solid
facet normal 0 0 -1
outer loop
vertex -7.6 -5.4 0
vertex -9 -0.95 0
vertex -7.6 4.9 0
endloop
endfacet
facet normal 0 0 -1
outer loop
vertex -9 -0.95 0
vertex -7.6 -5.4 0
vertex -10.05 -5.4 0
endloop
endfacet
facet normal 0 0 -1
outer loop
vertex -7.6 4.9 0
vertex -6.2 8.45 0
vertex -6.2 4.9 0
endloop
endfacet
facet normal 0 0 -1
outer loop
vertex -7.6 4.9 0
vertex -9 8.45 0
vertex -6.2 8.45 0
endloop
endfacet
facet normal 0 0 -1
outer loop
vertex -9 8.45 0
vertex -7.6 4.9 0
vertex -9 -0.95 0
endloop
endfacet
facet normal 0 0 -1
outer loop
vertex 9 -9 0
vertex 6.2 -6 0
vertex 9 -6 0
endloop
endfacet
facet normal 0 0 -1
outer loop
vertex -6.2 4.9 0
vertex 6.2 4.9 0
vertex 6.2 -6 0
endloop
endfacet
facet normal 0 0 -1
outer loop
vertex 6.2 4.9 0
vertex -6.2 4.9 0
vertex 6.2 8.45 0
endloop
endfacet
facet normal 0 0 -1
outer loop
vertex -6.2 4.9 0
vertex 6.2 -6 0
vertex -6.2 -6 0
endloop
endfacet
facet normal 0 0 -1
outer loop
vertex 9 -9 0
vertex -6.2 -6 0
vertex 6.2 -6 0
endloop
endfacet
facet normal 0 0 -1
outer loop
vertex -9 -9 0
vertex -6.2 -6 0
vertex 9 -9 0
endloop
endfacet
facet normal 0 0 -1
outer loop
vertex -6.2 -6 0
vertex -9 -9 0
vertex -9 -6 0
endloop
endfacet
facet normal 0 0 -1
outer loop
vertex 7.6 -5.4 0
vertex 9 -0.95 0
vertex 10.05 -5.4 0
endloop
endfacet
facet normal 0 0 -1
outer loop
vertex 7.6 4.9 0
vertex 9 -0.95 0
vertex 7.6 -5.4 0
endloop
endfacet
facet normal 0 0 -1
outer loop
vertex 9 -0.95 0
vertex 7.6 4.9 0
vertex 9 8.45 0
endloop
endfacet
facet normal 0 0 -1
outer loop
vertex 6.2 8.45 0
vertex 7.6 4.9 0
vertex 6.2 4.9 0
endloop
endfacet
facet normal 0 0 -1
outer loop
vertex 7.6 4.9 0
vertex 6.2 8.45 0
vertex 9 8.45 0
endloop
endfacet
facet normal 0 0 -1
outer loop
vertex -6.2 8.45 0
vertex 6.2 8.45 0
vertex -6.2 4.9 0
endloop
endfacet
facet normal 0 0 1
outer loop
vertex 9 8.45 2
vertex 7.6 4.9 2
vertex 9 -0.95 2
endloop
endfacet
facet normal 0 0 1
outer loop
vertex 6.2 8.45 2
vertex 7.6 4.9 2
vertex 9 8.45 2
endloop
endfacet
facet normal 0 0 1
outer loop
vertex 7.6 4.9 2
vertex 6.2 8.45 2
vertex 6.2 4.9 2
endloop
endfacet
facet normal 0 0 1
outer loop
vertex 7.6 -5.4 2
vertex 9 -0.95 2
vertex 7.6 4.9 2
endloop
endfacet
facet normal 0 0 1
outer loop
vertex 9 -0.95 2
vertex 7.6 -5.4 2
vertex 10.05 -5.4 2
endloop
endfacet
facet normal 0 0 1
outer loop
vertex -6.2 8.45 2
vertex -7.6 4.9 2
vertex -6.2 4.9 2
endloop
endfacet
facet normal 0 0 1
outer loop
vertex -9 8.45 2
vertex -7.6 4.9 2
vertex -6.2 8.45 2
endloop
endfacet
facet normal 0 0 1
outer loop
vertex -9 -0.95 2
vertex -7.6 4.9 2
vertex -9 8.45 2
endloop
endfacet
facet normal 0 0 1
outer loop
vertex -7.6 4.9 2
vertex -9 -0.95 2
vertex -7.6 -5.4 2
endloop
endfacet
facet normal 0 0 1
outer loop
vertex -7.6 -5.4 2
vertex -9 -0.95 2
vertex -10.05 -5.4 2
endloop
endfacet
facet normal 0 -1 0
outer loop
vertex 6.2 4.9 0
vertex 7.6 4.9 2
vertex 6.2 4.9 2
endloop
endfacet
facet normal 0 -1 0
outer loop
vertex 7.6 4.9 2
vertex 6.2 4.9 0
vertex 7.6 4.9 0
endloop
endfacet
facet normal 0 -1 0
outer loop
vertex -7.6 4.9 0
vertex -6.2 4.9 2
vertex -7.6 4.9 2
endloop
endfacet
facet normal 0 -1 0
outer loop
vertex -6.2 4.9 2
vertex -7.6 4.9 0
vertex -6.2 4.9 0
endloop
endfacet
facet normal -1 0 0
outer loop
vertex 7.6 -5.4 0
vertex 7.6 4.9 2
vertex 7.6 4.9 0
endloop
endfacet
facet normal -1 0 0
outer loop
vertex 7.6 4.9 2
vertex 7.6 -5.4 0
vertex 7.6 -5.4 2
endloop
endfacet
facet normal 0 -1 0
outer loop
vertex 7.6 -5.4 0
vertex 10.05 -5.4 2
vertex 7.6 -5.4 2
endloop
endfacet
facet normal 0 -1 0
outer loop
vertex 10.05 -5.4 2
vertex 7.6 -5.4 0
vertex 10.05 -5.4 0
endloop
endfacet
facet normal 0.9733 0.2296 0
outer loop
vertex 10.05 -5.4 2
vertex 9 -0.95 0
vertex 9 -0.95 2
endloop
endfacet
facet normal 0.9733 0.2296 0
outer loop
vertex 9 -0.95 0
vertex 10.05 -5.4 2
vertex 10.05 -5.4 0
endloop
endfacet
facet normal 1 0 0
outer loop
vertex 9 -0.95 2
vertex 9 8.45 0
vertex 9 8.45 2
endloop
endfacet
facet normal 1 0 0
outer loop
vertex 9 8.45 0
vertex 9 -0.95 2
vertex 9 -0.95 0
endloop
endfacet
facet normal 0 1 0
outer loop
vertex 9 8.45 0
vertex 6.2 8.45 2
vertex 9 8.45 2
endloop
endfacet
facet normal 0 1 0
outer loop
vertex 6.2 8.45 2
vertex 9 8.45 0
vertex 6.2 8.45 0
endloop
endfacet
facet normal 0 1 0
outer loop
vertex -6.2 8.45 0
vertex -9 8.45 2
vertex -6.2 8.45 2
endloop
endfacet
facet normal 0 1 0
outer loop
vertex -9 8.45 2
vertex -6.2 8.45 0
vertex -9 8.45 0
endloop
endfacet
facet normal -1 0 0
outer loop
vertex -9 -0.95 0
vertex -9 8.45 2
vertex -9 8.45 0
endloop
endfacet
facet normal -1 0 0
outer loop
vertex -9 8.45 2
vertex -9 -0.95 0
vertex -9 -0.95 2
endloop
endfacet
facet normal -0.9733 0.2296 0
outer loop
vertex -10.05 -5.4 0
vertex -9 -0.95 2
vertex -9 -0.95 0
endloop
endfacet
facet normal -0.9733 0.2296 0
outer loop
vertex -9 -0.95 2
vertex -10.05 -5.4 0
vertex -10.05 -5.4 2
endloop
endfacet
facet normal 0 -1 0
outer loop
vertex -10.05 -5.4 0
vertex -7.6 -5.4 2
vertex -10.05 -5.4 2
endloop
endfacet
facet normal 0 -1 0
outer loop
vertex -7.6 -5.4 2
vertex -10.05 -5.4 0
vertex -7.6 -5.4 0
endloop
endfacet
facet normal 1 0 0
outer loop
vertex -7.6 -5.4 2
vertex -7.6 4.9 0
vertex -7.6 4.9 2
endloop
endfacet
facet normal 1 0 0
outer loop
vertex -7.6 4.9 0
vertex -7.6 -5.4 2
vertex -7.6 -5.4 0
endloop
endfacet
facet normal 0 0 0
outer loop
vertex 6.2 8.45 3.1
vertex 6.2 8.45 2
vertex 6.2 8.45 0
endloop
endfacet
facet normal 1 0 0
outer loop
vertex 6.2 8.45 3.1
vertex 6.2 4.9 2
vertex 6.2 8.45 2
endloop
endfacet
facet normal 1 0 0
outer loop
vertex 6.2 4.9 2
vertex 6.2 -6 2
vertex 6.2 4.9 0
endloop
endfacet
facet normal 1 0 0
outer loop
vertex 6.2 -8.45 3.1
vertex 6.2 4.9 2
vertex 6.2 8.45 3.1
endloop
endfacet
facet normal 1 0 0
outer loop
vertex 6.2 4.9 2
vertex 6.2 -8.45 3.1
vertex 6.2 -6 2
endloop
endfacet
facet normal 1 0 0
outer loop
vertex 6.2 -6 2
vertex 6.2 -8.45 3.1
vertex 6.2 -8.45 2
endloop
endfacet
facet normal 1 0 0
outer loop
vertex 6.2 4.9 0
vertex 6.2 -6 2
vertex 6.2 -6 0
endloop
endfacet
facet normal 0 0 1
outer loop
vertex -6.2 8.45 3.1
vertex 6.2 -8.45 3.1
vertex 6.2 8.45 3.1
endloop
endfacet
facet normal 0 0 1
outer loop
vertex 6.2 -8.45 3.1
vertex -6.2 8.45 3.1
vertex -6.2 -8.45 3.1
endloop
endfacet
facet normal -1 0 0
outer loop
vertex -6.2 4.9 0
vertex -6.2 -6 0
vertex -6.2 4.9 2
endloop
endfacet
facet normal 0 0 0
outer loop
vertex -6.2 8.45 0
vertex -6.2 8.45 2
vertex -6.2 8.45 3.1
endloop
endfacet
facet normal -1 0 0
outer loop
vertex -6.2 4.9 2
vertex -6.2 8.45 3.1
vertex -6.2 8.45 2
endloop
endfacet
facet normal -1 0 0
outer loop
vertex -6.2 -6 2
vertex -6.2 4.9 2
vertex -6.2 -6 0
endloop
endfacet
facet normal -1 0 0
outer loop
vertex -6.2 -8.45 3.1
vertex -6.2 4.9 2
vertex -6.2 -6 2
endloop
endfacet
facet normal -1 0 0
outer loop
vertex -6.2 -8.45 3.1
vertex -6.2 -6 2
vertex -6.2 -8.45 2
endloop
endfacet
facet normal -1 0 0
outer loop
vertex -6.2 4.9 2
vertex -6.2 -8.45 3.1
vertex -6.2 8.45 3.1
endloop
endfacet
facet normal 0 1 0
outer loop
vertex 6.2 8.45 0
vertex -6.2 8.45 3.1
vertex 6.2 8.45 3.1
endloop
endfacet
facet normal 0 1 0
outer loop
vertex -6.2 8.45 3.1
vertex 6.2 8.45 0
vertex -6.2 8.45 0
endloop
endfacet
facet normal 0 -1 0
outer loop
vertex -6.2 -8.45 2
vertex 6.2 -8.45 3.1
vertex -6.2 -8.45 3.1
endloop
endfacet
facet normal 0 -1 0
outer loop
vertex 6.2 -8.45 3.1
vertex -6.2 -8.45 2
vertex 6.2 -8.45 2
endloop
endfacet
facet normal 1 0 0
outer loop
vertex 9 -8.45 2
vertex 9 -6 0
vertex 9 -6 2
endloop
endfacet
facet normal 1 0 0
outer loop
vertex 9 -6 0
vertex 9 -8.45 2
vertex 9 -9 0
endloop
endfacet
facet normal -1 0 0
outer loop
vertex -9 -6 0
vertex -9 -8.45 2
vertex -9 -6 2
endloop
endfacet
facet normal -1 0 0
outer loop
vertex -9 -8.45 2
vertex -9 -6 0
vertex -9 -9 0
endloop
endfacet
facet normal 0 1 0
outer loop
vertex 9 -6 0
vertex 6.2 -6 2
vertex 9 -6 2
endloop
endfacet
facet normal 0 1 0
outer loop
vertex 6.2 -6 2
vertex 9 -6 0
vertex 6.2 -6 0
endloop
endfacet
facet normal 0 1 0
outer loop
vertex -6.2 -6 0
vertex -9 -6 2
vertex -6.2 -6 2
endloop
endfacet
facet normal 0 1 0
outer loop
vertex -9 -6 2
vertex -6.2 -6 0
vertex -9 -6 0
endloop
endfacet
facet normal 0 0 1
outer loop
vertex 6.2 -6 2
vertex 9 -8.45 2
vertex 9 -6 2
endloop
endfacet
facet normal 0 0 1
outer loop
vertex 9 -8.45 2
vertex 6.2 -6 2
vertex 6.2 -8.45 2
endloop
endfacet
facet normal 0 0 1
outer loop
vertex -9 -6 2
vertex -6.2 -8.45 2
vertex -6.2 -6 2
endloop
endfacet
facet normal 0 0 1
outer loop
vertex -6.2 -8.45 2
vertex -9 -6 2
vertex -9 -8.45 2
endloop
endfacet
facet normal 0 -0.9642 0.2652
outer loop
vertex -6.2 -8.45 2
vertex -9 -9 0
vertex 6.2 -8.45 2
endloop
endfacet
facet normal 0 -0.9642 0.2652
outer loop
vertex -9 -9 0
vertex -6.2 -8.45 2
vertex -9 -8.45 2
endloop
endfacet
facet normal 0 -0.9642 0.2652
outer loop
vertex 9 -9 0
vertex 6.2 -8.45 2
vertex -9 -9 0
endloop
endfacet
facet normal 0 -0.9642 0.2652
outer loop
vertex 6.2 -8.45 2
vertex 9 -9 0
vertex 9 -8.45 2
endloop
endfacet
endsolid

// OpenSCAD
module flashspacer() {
	union() {
		linear_extrude(
			height = 2,
			convexity = 4
		) polygon(
			points = [
				// Right-Hand Wing
				[7.6, 4.9], [7.6, -5.4], [10.05, -5.4], [9, -0.95], [9, 8.45],
				// Left-Hand Wing
				[-9, 8.45], [-9, -0.95], [-10.05, -5.4], [-7.6, -5.4], [-7.6, 4.9]
			],
			paths = [
				[0,1,2,3,4,5,6,7,8,9]
			],
			convexity = 4
		);
		translate(v = [-6.2, -8.45, 0])
			cube(size = [12.4, 16.9, 3.1]);
		rotate(a = [0, -90, 0])
			linear_extrude(height = 18, center = true)
			polygon(
				points = [[0, -6],[0, -9],[2, -8.45],[2, -6]],
				paths = [[0,1,2,3]]
			);
	}
}

flashspacer();
